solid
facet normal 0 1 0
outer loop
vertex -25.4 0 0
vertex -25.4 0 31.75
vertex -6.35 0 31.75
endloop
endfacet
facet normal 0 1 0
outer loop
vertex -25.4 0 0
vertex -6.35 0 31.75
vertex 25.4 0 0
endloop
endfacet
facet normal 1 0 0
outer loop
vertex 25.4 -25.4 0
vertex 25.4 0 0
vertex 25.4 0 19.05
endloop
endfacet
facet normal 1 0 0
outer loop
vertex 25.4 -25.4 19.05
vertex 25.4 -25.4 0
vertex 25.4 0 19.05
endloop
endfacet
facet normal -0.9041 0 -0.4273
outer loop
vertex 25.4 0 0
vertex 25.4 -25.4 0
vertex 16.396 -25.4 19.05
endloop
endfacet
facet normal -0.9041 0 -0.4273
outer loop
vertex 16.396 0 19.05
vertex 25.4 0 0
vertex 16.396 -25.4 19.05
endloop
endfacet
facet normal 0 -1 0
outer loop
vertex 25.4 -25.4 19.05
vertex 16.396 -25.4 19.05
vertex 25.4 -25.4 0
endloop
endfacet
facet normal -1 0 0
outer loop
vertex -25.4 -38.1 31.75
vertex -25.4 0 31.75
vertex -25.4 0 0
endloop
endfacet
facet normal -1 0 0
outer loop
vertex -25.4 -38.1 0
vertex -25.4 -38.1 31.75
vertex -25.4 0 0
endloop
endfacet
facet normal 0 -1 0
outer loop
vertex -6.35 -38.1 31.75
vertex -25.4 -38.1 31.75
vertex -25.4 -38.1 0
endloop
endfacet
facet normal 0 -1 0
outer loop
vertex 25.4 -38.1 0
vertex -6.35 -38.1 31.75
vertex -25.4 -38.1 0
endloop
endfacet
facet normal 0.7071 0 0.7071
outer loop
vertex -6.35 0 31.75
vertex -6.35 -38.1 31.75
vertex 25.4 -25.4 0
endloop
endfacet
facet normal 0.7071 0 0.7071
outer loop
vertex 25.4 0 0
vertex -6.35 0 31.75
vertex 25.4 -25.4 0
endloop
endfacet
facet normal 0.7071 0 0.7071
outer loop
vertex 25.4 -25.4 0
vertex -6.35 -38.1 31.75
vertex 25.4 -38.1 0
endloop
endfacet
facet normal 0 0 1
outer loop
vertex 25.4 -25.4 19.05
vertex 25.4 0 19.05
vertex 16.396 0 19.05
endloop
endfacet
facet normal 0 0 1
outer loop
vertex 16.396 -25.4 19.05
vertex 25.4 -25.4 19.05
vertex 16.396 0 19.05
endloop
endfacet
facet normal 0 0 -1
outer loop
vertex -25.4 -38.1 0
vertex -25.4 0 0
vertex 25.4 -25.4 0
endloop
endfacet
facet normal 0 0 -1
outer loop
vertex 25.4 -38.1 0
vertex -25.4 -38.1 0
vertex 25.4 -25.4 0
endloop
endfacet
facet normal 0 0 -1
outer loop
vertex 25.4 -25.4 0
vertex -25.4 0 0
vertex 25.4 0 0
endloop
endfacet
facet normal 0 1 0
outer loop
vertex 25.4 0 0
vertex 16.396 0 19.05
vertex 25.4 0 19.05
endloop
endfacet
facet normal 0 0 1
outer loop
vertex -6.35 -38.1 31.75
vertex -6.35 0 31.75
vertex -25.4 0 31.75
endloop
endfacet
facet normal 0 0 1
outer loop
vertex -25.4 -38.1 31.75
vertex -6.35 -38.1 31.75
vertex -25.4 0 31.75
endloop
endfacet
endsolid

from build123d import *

# Parameters (mm, degrees)
F1_DEPTH = 38.1
F3_DEPTH = 12.7
F5_DEPTH = 25.4
F6_DEPTH = 12.7


with BuildPart() as f1:
    # F0 (on Front) → F1 (new body)
    with BuildSketch(Plane.XZ):
        Polygon((-25.4, 0), (0, 0), (25.4, 0), (25.4, 31.75), (-25.4, 31.75), align=None)
    extrude(amount=F1_DEPTH)

    # F2 (on face) → F3 (cut)
    with BuildSketch(Plane.XZ.offset(38.1)):
        Polygon((25.4, 31.75), (-6.35, 31.75), (25.4, 0), align=None)
    extrude(amount=-F3_DEPTH, mode=Mode.SUBTRACT)

    # F4 (on face) → F5 (cut)
    with BuildSketch(Plane.XZ.offset(25.4)):
        Polygon((25.4, 0), (10.3934332728, 31.75), (-6.35, 31.75), align=None)
    extrude(amount=-F5_DEPTH, mode=Mode.SUBTRACT)

    # F6 (cut): a face of the model
    f6_faces = [f1.faces().sort_by_distance(p)[0] for p in [
        (17.8967166364, -12.7, 31.75),
    ]]
    extrude(f6_faces, amount=-F6_DEPTH, mode=Mode.SUBTRACT)


solid = f1.part
